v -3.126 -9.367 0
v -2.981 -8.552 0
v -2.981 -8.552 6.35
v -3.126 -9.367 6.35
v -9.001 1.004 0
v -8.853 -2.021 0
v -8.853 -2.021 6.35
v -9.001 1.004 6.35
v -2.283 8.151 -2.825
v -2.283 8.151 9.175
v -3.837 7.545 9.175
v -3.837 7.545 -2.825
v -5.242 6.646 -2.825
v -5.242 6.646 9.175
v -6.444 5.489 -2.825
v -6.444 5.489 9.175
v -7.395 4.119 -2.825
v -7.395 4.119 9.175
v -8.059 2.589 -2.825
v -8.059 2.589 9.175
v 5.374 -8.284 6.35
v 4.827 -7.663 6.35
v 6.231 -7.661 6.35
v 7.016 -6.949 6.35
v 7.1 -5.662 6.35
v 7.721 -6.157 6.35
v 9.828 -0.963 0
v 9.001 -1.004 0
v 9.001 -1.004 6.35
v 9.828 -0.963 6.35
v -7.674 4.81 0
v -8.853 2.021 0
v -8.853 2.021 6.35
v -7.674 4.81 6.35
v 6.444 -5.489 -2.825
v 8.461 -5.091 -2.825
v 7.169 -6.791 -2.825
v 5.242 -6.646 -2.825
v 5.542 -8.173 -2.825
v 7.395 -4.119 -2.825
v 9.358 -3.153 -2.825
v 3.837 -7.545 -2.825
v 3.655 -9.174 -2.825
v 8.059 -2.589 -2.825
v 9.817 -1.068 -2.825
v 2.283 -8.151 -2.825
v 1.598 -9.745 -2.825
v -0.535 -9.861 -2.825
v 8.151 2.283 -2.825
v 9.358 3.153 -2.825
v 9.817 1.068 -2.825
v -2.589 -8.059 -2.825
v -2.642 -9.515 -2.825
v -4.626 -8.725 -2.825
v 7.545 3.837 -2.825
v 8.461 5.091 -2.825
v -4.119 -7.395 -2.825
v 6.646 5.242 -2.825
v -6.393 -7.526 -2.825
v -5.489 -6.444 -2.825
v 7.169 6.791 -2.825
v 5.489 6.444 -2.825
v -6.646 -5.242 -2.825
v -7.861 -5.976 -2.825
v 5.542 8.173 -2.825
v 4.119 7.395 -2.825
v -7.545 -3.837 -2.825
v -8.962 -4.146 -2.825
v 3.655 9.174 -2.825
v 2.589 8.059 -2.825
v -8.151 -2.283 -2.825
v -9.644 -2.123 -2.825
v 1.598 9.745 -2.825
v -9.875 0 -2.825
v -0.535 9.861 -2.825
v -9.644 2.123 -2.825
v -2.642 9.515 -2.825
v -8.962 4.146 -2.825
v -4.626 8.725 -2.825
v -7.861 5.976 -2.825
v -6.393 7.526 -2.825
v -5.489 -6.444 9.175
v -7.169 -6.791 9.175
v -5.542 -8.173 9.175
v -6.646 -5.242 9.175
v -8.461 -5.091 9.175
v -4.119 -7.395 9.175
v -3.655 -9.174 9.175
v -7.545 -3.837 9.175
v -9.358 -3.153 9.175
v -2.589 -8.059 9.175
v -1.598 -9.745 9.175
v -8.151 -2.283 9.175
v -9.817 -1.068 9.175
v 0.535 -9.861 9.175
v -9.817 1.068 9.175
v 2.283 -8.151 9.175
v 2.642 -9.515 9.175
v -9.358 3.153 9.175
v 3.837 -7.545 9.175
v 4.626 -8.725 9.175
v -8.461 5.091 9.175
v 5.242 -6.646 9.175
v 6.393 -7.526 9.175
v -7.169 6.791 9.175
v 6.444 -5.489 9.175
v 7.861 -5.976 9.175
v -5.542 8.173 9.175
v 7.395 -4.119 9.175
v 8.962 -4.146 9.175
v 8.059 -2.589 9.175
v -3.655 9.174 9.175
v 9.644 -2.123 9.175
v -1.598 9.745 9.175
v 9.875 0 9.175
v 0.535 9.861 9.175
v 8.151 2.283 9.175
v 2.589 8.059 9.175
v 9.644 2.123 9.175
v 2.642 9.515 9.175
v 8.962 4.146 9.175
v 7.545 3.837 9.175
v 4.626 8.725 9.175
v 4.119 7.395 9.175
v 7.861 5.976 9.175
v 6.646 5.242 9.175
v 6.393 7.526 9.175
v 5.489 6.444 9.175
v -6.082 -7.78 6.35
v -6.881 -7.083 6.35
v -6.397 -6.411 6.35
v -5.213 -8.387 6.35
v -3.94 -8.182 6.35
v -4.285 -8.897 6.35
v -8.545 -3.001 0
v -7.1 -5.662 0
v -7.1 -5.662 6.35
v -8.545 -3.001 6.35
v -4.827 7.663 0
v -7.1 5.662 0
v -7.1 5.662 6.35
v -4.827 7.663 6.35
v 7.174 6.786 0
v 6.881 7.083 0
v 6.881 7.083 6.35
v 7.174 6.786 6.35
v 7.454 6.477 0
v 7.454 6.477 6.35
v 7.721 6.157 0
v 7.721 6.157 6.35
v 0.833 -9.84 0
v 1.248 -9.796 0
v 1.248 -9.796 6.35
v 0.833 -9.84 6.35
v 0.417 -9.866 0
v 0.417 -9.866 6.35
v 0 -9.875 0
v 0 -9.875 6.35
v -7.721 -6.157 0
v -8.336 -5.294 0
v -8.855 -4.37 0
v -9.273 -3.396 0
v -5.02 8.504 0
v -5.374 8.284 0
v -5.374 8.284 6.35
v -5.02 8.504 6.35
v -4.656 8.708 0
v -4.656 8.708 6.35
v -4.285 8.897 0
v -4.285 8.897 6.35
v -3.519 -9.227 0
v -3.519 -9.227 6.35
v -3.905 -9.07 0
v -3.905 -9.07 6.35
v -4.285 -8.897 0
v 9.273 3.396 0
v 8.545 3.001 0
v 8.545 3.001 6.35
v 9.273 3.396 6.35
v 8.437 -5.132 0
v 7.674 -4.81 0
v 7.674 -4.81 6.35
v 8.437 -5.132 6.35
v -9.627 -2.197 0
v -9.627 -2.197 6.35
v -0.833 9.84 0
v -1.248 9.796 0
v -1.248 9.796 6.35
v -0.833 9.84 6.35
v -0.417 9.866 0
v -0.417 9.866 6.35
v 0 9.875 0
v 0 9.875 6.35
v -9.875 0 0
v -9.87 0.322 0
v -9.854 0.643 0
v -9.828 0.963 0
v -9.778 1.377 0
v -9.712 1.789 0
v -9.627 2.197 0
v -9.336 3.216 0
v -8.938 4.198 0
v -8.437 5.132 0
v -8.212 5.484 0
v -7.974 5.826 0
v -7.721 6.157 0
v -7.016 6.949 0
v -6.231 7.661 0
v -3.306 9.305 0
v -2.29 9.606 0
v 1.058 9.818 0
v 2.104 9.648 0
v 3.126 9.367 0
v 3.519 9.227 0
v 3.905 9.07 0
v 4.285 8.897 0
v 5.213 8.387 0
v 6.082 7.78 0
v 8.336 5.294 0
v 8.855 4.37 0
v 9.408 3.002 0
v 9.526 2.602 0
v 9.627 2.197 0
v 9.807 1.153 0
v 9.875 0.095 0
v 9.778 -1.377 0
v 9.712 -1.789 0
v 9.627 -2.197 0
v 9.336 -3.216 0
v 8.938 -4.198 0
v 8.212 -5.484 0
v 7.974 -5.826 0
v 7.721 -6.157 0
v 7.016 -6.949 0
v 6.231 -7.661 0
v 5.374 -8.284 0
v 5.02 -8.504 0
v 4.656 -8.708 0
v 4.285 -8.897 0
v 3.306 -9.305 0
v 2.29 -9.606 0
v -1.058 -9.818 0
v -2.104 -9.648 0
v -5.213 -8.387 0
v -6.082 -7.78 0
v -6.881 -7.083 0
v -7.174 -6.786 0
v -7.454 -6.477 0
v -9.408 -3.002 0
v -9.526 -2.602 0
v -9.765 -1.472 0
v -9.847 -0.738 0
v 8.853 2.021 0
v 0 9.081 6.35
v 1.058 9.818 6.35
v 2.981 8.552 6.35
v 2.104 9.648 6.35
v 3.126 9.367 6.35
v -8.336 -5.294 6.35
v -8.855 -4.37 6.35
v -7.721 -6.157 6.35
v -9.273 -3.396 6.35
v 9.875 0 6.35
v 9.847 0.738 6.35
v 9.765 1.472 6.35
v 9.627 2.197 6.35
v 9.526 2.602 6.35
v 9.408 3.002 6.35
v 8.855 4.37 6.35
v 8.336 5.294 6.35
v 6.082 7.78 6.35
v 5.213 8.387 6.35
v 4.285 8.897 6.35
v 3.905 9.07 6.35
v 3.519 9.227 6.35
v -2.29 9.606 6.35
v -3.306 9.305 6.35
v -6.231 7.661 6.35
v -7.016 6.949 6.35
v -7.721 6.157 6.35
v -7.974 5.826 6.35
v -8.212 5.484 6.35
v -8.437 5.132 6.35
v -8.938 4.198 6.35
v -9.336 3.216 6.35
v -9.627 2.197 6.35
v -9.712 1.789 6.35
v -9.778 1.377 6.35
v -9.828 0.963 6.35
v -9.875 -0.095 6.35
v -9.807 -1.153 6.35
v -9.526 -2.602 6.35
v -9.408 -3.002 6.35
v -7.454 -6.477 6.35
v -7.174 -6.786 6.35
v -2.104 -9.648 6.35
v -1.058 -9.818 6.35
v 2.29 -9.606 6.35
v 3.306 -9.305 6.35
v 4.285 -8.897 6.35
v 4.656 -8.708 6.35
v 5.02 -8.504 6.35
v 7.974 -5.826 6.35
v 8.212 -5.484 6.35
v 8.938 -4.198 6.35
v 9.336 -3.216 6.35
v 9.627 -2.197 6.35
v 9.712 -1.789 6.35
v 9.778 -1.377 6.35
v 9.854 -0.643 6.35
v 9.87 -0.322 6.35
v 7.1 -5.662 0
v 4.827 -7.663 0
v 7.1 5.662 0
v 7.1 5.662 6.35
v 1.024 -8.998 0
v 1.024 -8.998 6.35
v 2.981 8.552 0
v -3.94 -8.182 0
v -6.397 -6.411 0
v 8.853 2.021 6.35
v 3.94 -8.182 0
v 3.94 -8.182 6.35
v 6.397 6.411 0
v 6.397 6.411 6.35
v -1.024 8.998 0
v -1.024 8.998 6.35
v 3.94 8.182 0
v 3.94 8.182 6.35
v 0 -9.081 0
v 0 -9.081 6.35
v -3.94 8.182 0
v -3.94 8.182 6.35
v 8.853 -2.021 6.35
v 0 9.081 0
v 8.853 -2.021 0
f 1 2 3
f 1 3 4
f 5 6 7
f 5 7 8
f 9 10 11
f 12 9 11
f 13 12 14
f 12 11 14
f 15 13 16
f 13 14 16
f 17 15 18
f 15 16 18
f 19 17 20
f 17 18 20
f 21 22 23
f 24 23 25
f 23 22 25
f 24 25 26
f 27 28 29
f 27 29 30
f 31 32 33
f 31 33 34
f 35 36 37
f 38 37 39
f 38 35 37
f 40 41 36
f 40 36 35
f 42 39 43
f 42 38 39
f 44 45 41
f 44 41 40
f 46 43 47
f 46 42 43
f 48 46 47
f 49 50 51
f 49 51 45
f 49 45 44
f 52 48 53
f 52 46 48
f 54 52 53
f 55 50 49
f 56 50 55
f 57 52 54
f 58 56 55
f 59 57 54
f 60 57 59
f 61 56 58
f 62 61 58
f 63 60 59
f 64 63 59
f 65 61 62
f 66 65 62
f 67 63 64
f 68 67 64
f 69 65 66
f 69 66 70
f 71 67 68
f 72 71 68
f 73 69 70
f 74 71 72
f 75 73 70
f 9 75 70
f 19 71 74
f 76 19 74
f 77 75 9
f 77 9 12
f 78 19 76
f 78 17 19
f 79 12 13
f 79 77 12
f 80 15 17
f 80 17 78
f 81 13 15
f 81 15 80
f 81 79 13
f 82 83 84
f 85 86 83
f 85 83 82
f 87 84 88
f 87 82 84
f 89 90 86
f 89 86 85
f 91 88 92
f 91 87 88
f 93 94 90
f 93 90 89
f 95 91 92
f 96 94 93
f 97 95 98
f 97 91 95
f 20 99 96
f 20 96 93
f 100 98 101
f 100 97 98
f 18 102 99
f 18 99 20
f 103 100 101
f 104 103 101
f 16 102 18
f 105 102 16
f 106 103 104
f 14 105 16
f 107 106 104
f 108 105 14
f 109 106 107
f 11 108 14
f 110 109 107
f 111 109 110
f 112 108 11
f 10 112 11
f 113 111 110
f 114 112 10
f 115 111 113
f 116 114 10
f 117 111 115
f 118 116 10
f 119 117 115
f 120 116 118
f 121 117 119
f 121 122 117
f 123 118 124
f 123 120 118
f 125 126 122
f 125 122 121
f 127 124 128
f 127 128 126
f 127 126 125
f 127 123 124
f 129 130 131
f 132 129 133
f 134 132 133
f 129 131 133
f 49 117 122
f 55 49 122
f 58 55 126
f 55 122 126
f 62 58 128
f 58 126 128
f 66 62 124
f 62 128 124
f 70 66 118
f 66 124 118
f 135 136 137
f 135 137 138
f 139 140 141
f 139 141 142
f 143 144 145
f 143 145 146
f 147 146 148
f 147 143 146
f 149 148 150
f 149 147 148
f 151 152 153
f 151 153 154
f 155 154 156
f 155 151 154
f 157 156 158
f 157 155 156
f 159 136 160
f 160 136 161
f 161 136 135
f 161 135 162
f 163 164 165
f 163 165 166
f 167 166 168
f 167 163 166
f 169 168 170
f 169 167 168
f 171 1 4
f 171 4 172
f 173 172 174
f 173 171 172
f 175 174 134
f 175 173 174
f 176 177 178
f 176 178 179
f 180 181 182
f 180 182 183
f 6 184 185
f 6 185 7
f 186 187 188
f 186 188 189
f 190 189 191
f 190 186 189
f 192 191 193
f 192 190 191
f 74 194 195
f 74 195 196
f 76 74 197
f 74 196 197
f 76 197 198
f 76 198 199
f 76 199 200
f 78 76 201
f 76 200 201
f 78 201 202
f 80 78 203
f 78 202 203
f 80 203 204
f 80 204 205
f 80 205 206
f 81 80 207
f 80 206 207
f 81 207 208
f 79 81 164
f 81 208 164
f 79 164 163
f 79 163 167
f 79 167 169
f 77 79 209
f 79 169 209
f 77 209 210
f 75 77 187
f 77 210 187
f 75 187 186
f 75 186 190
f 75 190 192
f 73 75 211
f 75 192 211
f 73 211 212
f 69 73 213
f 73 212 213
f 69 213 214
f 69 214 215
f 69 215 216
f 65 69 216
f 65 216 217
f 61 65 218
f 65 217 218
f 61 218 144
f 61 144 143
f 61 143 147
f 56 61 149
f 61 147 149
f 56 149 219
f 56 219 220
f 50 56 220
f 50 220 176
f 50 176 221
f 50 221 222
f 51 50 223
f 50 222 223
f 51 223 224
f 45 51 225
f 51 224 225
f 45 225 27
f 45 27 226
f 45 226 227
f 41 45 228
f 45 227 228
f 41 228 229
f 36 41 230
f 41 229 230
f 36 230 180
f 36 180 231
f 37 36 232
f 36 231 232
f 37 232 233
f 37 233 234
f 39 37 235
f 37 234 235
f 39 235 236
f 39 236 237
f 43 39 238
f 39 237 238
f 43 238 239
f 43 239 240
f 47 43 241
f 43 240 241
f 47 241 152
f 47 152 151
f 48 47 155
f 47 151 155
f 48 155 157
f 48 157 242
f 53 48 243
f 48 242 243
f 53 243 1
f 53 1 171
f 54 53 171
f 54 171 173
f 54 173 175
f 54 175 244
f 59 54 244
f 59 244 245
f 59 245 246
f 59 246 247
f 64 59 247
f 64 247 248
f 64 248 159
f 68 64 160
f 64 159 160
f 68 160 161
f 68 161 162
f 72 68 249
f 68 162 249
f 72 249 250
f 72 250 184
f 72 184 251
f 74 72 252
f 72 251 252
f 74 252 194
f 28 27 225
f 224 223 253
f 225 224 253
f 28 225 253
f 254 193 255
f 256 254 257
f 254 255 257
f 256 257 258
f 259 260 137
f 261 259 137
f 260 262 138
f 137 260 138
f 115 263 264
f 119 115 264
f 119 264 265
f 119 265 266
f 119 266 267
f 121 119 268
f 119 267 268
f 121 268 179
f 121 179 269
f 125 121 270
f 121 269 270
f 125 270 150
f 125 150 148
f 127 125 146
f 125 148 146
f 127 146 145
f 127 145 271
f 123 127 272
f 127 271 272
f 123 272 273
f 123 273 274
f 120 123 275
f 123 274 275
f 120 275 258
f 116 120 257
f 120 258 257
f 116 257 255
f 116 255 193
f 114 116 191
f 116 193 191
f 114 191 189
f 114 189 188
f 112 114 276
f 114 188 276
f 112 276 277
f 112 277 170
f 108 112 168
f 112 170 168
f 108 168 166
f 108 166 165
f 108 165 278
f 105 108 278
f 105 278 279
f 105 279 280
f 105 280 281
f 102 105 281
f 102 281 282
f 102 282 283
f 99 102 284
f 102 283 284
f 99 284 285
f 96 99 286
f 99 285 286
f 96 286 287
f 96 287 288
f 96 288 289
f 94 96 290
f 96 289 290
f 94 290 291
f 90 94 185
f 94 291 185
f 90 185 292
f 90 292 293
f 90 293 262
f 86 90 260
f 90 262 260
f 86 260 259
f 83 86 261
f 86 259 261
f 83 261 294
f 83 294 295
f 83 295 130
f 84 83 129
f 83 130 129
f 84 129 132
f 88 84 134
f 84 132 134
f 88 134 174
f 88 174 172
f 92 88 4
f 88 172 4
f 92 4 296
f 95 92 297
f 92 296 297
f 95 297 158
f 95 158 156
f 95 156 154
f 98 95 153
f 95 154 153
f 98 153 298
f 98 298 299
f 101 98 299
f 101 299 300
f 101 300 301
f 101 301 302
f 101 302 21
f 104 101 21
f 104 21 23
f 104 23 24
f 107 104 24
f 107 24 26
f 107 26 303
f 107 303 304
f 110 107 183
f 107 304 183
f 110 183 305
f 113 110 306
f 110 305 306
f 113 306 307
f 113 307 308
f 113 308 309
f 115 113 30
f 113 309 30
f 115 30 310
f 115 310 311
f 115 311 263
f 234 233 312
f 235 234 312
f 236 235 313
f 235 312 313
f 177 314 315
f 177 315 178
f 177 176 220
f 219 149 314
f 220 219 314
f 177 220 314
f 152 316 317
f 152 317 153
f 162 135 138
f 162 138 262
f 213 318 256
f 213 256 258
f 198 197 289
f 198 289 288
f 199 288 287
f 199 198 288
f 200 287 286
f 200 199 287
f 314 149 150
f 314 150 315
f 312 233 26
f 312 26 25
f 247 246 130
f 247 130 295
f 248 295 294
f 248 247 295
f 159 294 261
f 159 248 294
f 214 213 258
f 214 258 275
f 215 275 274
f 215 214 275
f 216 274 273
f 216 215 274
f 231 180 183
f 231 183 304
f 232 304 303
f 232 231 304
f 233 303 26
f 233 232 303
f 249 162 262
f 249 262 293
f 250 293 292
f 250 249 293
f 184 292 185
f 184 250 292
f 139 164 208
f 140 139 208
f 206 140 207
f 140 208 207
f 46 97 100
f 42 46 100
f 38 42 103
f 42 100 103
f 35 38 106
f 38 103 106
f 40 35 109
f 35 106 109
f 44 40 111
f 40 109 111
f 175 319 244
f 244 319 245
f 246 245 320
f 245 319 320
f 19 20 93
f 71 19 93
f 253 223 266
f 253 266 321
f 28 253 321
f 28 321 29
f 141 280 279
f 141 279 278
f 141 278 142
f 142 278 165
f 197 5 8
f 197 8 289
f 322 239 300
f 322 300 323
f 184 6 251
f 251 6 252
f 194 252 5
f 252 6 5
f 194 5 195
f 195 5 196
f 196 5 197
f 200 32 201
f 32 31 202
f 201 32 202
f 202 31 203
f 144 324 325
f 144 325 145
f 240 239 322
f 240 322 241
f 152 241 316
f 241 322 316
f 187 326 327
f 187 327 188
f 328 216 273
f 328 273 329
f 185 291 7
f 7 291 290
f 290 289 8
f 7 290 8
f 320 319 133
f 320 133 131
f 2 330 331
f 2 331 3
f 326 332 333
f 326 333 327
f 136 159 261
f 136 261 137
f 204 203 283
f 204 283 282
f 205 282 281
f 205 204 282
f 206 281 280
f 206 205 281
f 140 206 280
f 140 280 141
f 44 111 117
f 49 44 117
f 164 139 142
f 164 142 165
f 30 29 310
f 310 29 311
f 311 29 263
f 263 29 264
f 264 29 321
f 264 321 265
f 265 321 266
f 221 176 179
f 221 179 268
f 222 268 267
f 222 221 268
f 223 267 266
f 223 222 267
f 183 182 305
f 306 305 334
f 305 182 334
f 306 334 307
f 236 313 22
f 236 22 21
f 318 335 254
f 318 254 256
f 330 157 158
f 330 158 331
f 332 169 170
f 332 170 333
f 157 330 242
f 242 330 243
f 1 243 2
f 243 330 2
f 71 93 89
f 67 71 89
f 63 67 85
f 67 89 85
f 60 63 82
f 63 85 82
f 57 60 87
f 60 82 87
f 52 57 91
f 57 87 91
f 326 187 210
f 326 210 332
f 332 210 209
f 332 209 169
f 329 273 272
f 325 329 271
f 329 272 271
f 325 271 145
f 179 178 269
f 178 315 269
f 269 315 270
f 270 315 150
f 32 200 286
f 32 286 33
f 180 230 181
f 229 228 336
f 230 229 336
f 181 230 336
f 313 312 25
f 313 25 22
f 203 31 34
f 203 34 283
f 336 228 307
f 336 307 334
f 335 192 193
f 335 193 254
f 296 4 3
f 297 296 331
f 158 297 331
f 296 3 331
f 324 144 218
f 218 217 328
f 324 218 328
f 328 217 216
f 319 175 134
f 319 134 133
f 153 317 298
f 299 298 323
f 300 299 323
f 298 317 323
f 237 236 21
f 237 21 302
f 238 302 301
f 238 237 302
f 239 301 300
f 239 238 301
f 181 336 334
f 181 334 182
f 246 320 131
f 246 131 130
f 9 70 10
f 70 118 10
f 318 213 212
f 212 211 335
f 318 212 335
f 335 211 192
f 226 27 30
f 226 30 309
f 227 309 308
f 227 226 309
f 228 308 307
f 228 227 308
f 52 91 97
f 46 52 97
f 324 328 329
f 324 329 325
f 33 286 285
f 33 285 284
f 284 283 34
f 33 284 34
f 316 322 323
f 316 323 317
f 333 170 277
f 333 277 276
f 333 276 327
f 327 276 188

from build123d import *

# Parameters (mm, degrees)
BOSS_EXTRUDE1_DEPTH = 6.35
SKETCH3_R           = 9.875
BOSS_EXTRUDE3_DEPTH = 2.825
SKETCH7_R           = 9.875
BOSS_EXTRUDE5_DEPTH = 2.825


with BuildPart() as part:
    # Sketch1 → Boss-Extrude1 (new body)
    with BuildSketch(Plane.XY):
        with BuildLine():
            Line((0, 9.081), (2.981324224, 8.551667078))
            Line((2.981324224, 8.551667078), (3.126108811, 9.367127025))
            ThreePointArc((3.126108811, 9.367127025), (3.712801822, 9.150449586), (4.284601924, 8.897067571))
            Line((4.284601924, 8.897067571), (3.940098235, 8.181698289))
            Line((3.940098235, 8.181698289), (6.396509598, 6.411237704))
            Line((6.396509598, 6.411237704), (6.880770815, 7.083122051))
            ThreePointArc((6.880770815, 7.083122051), (7.315350136, 6.633345867), (7.720585889, 6.156961793))
            Line((7.720585889, 6.156961793), (7.099811692, 5.661910891))
            Line((7.099811692, 5.661910891), (8.544787799, 3.000984074))
            Line((8.544787799, 3.000984074), (9.272611772, 3.396217886))
            ThreePointArc((9.272611772, 3.396217886), (9.469003638, 2.802426646), (9.627413133, 2.197394223))
            Line((9.627413133, 2.197394223), (8.853320371, 2.020712601))
            Line((8.853320371, 2.020712601), (9.00066598, -1.003651256))
            Line((9.00066598, -1.003651256), (9.827898246, -0.963348883))
            ThreePointArc((9.827898246, -0.963348883), (9.74720484, -1.583547541), (9.627413133, -2.197394223))
            Line((9.627413133, -2.197394223), (8.853320371, -2.020712601))
            Line((8.853320371, -2.020712601), (7.673851879, -4.809501146))
            Line((7.673851879, -4.809501146), (8.436648941, -5.132112591))
            ThreePointArc((8.436648941, -5.132112591), (8.094852581, -5.655880717), (7.720585889, -6.156961793))
            Line((7.720585889, -6.156961793), (7.099811692, -5.661910891))
            Line((7.099811692, -5.661910891), (4.827137299, -7.66277035))
            Line((4.827137299, -7.66277035), (5.374417845, -8.284398459))
            ThreePointArc((5.374417845, -8.284398459), (4.839215493, -8.607997352), (4.284601924, -8.897067571))
            Line((4.284601924, -8.897067571), (3.940098235, -8.181698289))
            Line((3.940098235, -8.181698289), (1.024348976, -8.998333907))
            Line((1.024348976, -8.998333907), (1.247717382, -9.795857611))
            ThreePointArc((1.247717382, -9.795857611), (0.625112426, -9.855194542), (0, -9.875))
            Line((0, -9.875), (0, -9.081))
            Line((0, -9.081), (-2.981324224, -8.551667078))
            Line((-2.981324224, -8.551667078), (-3.126108811, -9.367127025))
            ThreePointArc((-3.126108811, -9.367127025), (-3.712801822, -9.150449586), (-4.284601924, -8.897067571))
            Line((-4.284601924, -8.897067571), (-3.940098235, -8.181698289))
            Line((-3.940098235, -8.181698289), (-6.396509598, -6.411237704))
            Line((-6.396509598, -6.411237704), (-6.880770815, -7.083122051))
            ThreePointArc((-6.880770815, -7.083122051), (-7.315350136, -6.633345867), (-7.720585889, -6.156961793))
            Line((-7.720585889, -6.156961793), (-7.099811692, -5.661910891))
            Line((-7.099811692, -5.661910891), (-8.544787799, -3.000984074))
            Line((-8.544787799, -3.000984074), (-9.272611772, -3.396217886))
            ThreePointArc((-9.272611772, -3.396217886), (-9.469003638, -2.802426646), (-9.627413133, -2.197394223))
            Line((-9.627413133, -2.197394223), (-8.853320371, -2.020712601))
            Line((-8.853320371, -2.020712601), (-9.00066598, 1.003651256))
            Line((-9.00066598, 1.003651256), (-9.827898246, 0.963348883))
            ThreePointArc((-9.827898246, 0.963348883), (-9.74720484, 1.583547541), (-9.627413133, 2.197394223))
            Line((-9.627413133, 2.197394223), (-8.853320371, 2.020712601))
            Line((-8.853320371, 2.020712601), (-7.673851879, 4.809501146))
            Line((-7.673851879, 4.809501146), (-8.436648941, 5.132112591))
            ThreePointArc((-8.436648941, 5.132112591), (-8.094852581, 5.655880717), (-7.720585889, 6.156961793))
            Line((-7.720585889, 6.156961793), (-7.099811692, 5.661910891))
            Line((-7.099811692, 5.661910891), (-4.827137299, 7.66277035))
            Line((-4.827137299, 7.66277035), (-5.374417845, 8.284398459))
            ThreePointArc((-5.374417845, 8.284398459), (-4.839215493, 8.607997352), (-4.284601924, 8.897067571))
            Line((-4.284601924, 8.897067571), (-3.940098235, 8.181698289))
            Line((-3.940098235, 8.181698289), (-1.024348976, 8.998333907))
            Line((-1.024348976, 8.998333907), (-1.247717382, 9.795857611))
            ThreePointArc((-1.247717382, 9.795857611), (-0.625112426, 9.855194542), (0, 9.875))
            Line((0, 9.875), (0, 9.081))
        make_face()
        with BuildLine():
            Line((2.58926817, 8.059275113), (-2.283002739, 8.151326487))
            ThreePointArc((-2.283002739, 8.151326487), (-5.871524586, 6.097657258), (-8.059275113, 2.58926817))
            Line((-8.059275113, 2.58926817), (-8.151326487, -2.283002739))
            ThreePointArc((-8.151326487, -2.283002739), (-6.097657258, -5.871524586), (-2.58926817, -8.059275113))
            Line((-2.58926817, -8.059275113), (2.283002739, -8.151326487))
            ThreePointArc((2.283002739, -8.151326487), (5.871524586, -6.097657258), (8.059275113, -2.58926817))
            Line((8.059275113, -2.58926817), (8.151326487, 2.283002739))
            ThreePointArc((8.151326487, 2.283002739), (6.097657258, 5.871524586), (2.58926817, 8.059275113))
        make_face(mode=Mode.SUBTRACT)
    extrude(amount=BOSS_EXTRUDE1_DEPTH)

    # Sketch3 → Boss-Extrude3 (add)
    with BuildSketch(Plane.XY.offset(6.35)):
        Circle(SKETCH3_R)
        with BuildLine():
            Line((-2.283002739, 8.151326487), (2.58926817, 8.059275113))
            ThreePointArc((2.58926817, 8.059275113), (6.097657258, 5.871524586), (8.151326487, 2.283002739))
            Line((8.151326487, 2.283002739), (8.059275113, -2.58926817))
            ThreePointArc((8.059275113, -2.58926817), (5.871524586, -6.097657258), (2.283002739, -8.151326487))
            Line((2.283002739, -8.151326487), (-2.58926817, -8.059275113))
            ThreePointArc((-2.58926817, -8.059275113), (-6.097657258, -5.871524586), (-8.151326487, -2.283002739))
            Line((-8.151326487, -2.283002739), (-8.059275113, 2.58926817))
            ThreePointArc((-8.059275113, 2.58926817), (-5.871524586, 6.097657258), (-2.283002739, 8.151326487))
        make_face(mode=Mode.SUBTRACT)
    extrude(amount=BOSS_EXTRUDE3_DEPTH)

    # Sketch7 → Boss-Extrude5 (add)
    with BuildSketch(Plane(origin=(0, 0, 0), x_dir=(-1, 0, 0), z_dir=(0, 0, -1))):
        Circle(SKETCH7_R)
        with BuildLine():
            Line((-2.58926817, 8.059275113), (2.283002739, 8.151326487))
            ThreePointArc((2.283002739, 8.151326487), (5.871524586, 6.097657258), (8.059275113, 2.58926817))
            Line((8.059275113, 2.58926817), (8.151326487, -2.283002739))
            ThreePointArc((8.151326487, -2.283002739), (6.097657258, -5.871524586), (2.58926817, -8.059275113))
            Line((2.58926817, -8.059275113), (-2.283002739, -8.151326487))
            ThreePointArc((-2.283002739, -8.151326487), (-5.871524586, -6.097657258), (-8.059275113, -2.58926817))
            Line((-8.059275113, -2.58926817), (-8.151326487, 2.283002739))
            ThreePointArc((-8.151326487, 2.283002739), (-6.097657258, 5.871524586), (-2.58926817, 8.059275113))
        make_face(mode=Mode.SUBTRACT)
    extrude(amount=BOSS_EXTRUDE5_DEPTH)


solid = part.part
